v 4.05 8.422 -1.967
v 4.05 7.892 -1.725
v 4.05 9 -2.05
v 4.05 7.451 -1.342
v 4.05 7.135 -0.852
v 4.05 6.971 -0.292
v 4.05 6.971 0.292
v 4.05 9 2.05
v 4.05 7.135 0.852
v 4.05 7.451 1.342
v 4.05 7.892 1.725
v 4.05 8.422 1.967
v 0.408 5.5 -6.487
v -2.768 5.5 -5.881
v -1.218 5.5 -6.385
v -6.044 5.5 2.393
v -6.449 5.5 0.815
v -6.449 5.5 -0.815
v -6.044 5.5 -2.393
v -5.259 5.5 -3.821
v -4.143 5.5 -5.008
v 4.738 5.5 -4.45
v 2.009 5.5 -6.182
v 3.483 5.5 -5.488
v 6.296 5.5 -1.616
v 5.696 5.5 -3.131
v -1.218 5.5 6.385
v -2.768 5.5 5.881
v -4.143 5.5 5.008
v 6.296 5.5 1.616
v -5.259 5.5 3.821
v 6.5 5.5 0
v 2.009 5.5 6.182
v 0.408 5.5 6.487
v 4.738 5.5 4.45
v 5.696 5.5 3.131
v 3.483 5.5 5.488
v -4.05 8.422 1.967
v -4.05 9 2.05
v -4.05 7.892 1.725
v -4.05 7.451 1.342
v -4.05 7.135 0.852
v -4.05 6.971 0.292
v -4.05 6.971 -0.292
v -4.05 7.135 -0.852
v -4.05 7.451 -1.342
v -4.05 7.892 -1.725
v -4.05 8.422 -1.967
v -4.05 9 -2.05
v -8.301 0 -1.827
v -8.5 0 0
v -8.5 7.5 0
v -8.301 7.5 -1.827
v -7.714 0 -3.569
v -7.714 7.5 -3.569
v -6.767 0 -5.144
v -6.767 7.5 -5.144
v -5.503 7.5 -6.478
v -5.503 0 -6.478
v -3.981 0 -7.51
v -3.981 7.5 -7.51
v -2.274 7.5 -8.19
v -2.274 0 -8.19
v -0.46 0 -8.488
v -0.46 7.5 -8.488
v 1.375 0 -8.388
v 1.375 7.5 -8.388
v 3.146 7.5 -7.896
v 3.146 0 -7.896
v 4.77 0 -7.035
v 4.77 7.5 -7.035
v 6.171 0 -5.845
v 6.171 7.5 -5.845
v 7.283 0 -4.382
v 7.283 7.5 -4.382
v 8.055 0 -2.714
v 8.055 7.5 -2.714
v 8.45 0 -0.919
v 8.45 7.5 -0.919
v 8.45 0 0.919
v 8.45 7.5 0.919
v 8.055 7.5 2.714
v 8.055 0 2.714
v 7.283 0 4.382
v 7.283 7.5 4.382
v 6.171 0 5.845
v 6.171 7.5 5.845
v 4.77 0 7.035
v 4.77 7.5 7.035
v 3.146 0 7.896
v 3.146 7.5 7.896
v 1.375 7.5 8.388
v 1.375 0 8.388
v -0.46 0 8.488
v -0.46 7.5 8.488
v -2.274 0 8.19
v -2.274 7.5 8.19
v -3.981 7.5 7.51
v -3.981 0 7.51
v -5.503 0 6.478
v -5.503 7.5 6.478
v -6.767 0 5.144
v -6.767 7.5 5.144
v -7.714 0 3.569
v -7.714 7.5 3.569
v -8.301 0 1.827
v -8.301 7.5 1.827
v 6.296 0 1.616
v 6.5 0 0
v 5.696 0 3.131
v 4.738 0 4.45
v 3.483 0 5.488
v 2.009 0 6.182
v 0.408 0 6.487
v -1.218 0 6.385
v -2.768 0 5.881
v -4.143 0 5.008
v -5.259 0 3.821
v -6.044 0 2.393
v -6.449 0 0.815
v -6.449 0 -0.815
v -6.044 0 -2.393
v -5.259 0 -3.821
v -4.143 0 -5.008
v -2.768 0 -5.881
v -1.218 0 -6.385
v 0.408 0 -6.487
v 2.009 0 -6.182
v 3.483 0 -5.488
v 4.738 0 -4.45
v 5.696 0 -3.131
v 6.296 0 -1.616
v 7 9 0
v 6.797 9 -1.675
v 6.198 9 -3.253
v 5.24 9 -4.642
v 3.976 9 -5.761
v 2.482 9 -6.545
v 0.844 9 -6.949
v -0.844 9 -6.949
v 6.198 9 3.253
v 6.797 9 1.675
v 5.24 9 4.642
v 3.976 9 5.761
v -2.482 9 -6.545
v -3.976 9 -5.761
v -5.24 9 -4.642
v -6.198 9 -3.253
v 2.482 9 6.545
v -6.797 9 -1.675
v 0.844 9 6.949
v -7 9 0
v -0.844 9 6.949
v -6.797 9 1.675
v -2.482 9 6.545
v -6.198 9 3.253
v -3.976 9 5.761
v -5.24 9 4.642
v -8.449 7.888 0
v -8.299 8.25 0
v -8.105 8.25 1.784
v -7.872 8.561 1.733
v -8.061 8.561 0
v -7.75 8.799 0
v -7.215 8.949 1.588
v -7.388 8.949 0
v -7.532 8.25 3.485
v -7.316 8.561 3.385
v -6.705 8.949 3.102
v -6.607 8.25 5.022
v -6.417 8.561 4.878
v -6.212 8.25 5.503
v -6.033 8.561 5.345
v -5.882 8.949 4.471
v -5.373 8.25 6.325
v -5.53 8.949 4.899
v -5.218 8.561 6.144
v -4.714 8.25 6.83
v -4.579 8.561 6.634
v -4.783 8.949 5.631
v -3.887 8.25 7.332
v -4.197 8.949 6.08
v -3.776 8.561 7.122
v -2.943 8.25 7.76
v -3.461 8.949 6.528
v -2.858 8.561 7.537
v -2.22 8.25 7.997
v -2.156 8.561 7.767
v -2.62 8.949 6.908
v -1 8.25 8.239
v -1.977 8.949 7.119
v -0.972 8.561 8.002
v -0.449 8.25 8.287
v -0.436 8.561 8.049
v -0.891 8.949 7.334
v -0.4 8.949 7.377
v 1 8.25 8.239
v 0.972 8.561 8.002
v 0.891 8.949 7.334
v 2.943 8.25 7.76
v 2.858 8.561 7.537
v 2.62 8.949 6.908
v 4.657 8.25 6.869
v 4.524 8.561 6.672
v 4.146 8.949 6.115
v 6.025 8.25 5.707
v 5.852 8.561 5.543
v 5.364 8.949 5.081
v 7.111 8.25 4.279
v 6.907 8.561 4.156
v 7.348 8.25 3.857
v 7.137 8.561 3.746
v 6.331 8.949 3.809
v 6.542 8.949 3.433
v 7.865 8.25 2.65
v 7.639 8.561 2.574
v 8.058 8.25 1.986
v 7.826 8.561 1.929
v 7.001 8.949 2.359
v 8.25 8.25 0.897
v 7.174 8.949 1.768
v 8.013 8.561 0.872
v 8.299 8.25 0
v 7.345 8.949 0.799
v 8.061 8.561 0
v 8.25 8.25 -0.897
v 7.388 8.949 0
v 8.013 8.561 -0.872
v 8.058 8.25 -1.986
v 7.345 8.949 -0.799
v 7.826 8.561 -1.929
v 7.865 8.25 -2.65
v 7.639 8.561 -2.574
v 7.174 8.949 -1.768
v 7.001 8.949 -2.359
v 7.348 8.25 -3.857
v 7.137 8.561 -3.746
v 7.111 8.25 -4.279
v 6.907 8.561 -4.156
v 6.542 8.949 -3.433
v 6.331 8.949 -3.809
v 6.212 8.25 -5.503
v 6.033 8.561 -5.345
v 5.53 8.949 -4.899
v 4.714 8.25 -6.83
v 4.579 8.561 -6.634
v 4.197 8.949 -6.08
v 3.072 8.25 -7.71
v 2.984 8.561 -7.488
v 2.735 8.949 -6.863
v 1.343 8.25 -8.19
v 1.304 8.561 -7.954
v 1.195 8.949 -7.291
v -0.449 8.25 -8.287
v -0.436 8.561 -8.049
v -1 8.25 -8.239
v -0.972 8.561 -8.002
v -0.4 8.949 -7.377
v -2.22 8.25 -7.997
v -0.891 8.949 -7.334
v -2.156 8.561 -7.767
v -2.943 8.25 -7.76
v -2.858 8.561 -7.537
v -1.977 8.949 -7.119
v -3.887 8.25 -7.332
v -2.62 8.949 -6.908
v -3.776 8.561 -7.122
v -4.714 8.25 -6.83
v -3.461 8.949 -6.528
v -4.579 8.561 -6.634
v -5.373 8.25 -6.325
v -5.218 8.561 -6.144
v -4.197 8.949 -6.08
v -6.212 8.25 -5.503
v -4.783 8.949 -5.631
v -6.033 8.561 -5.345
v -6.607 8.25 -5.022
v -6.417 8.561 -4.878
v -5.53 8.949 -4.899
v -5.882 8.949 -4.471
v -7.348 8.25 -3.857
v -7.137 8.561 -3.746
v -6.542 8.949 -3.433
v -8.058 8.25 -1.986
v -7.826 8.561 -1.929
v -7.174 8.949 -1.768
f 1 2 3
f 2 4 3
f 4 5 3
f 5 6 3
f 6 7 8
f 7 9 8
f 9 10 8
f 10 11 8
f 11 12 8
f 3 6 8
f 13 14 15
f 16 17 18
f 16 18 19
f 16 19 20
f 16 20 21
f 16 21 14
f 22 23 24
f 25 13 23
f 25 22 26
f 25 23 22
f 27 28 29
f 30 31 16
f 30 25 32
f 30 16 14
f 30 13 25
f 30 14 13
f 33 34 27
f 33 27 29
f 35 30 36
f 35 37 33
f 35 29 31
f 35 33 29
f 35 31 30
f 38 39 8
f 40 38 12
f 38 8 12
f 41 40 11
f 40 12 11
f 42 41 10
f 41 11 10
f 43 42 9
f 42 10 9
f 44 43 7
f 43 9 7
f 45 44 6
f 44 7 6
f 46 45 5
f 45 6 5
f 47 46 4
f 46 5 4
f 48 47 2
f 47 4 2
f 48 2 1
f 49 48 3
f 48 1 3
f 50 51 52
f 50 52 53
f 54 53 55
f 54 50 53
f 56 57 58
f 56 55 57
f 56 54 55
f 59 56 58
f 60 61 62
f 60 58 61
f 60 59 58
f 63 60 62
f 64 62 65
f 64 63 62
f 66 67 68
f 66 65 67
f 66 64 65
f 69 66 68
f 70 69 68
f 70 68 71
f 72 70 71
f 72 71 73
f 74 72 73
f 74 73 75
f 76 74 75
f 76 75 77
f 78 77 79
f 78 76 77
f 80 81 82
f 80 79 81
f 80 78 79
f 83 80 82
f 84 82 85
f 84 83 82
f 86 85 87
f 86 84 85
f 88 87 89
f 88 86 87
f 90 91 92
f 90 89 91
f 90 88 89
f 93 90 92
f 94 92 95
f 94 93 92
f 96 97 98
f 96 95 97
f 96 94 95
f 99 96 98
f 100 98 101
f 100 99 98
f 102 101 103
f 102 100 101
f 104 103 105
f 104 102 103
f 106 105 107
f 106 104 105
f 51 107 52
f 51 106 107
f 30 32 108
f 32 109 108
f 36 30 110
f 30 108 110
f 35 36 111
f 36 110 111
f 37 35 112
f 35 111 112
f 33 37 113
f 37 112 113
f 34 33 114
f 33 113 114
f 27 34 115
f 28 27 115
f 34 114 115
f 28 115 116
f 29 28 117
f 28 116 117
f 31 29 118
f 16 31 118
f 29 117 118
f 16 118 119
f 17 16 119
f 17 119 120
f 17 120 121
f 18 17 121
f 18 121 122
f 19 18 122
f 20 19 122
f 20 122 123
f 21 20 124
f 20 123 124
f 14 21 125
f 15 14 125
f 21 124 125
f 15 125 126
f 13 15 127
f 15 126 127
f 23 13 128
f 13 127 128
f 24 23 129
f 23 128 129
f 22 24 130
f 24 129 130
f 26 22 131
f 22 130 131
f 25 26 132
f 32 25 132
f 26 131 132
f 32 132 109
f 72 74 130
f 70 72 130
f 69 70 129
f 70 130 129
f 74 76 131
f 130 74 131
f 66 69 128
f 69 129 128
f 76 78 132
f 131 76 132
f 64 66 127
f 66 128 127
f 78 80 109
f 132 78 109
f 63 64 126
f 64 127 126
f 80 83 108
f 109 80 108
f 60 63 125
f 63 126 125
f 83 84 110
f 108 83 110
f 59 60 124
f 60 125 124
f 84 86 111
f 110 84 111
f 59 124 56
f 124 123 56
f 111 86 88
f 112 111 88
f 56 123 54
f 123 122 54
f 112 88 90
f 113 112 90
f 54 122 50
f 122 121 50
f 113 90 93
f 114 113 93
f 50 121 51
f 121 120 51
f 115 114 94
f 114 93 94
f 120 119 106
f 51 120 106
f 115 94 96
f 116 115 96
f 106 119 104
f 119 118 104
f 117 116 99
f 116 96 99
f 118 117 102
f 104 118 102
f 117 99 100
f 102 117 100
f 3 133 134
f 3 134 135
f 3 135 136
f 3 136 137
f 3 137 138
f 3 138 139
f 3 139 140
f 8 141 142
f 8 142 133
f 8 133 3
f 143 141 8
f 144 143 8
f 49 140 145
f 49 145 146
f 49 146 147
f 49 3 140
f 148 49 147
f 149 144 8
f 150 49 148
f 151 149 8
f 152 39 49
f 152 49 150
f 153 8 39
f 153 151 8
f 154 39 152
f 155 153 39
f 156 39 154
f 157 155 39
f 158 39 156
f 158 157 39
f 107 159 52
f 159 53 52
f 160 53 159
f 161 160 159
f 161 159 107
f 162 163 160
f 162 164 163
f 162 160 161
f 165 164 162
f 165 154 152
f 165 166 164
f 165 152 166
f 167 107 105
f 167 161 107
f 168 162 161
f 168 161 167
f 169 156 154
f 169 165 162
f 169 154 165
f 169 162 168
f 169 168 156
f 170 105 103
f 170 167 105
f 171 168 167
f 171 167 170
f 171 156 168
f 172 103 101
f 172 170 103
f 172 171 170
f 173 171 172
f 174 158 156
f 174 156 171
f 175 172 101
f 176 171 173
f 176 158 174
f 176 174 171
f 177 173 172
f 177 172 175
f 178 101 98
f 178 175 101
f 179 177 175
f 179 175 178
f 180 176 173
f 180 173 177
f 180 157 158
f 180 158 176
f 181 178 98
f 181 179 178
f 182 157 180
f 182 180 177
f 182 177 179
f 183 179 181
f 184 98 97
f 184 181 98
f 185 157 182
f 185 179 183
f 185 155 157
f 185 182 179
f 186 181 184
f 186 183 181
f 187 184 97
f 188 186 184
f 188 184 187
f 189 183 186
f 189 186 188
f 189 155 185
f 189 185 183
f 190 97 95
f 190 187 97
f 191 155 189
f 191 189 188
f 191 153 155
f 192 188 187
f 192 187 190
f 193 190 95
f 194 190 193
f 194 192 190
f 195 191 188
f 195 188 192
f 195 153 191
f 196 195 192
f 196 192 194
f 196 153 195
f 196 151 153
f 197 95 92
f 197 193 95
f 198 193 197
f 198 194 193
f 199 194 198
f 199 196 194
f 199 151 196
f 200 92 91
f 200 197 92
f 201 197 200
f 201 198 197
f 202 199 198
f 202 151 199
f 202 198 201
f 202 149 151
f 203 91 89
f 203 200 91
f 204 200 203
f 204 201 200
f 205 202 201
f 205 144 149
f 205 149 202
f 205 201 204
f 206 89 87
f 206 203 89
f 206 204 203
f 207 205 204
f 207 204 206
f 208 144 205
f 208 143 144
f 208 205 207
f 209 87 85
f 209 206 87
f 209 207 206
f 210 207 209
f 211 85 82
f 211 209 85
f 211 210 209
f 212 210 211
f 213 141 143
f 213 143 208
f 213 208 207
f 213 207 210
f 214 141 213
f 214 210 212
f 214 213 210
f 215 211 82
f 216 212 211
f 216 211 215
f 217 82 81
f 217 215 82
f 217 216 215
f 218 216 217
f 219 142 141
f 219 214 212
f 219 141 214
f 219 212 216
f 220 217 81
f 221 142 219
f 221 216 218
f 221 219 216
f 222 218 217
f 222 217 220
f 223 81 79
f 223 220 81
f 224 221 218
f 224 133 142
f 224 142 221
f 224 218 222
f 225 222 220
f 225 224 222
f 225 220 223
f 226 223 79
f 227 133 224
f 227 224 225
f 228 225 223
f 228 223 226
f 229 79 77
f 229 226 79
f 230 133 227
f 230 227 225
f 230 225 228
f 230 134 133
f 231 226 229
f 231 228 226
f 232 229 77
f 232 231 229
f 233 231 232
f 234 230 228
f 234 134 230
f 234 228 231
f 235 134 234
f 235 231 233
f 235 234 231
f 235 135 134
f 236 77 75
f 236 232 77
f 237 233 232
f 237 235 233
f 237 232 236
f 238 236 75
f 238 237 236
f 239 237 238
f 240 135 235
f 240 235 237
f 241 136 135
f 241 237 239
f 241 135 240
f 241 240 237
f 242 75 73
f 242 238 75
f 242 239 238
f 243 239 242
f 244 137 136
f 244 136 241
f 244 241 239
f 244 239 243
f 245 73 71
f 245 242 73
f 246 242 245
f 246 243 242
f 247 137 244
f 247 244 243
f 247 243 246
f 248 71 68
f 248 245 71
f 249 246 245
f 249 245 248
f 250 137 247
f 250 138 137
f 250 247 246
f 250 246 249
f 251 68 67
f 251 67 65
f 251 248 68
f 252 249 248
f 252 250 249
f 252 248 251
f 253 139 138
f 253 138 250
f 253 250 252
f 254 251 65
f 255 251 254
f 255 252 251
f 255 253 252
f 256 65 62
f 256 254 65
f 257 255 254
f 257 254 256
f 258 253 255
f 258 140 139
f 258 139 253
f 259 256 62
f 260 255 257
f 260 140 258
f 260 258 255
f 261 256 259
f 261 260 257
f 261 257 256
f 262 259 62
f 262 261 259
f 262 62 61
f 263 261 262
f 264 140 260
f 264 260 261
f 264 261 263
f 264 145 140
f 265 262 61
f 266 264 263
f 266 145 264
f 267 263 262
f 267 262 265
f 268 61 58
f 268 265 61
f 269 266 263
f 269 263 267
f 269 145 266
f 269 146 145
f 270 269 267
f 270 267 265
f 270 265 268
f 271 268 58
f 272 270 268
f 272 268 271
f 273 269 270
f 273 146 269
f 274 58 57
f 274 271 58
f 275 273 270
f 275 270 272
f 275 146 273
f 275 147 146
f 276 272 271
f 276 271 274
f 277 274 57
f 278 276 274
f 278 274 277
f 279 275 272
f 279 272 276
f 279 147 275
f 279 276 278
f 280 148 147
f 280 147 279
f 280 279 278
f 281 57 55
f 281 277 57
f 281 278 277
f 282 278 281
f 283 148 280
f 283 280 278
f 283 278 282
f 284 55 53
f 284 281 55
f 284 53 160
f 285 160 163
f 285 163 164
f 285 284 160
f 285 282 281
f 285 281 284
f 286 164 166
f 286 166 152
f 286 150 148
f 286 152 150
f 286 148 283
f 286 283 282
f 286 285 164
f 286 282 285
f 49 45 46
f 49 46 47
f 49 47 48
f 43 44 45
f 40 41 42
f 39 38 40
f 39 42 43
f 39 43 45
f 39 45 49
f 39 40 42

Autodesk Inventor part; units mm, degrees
ref_plane "YZ Plane" through (0, 0, 0) normal (1, 0, 0) x (0, 1, 0)
ref_plane "XZ Plane" through (0, 0, 0) normal (0, 1, 0) x (-1, 0, 0)
ref_plane "XY Plane" through (0, 0, 0) normal (0, 0, 1) x (1, 0, 0)
sketch "Sketch1" plane through (0, 0, 0) normal (0, 1, 0) x (-1, 0, 0)
  circle A0 centre (0, 0) radius 8.5
  dimension "d1" = 17
extrude "Extrusion1" add sketch "Sketch1" along normal blind 9
sketch "Sketch2" plane through (0, 0, 0) normal (0, -1, 0) x (1, 0, 0)
  circle A0 centre (0, 0) radius 6.5
  dimension "d4" = 13
extrude "Extrusion2" cut sketch "Sketch2" against normal blind 5.5
sketch "Sketch4" plane through (0, 0, 0) normal (1, 0, 0) x (0, 1, 0)
  line L0 (9, -8.5) -> (9, 8.5) projected
  circle A0 centre (9, 0) radius 2.05
  point P0 (0, 0)
  dimension "d7" = 4.1
extrude "Extrusion3" cut sketch "Sketch4" along normal mid plane 8.1
fillet "Fillet1" radius 1.5 1 edges at (8.5, 9, 0)
properties part number "magnet_holder"
